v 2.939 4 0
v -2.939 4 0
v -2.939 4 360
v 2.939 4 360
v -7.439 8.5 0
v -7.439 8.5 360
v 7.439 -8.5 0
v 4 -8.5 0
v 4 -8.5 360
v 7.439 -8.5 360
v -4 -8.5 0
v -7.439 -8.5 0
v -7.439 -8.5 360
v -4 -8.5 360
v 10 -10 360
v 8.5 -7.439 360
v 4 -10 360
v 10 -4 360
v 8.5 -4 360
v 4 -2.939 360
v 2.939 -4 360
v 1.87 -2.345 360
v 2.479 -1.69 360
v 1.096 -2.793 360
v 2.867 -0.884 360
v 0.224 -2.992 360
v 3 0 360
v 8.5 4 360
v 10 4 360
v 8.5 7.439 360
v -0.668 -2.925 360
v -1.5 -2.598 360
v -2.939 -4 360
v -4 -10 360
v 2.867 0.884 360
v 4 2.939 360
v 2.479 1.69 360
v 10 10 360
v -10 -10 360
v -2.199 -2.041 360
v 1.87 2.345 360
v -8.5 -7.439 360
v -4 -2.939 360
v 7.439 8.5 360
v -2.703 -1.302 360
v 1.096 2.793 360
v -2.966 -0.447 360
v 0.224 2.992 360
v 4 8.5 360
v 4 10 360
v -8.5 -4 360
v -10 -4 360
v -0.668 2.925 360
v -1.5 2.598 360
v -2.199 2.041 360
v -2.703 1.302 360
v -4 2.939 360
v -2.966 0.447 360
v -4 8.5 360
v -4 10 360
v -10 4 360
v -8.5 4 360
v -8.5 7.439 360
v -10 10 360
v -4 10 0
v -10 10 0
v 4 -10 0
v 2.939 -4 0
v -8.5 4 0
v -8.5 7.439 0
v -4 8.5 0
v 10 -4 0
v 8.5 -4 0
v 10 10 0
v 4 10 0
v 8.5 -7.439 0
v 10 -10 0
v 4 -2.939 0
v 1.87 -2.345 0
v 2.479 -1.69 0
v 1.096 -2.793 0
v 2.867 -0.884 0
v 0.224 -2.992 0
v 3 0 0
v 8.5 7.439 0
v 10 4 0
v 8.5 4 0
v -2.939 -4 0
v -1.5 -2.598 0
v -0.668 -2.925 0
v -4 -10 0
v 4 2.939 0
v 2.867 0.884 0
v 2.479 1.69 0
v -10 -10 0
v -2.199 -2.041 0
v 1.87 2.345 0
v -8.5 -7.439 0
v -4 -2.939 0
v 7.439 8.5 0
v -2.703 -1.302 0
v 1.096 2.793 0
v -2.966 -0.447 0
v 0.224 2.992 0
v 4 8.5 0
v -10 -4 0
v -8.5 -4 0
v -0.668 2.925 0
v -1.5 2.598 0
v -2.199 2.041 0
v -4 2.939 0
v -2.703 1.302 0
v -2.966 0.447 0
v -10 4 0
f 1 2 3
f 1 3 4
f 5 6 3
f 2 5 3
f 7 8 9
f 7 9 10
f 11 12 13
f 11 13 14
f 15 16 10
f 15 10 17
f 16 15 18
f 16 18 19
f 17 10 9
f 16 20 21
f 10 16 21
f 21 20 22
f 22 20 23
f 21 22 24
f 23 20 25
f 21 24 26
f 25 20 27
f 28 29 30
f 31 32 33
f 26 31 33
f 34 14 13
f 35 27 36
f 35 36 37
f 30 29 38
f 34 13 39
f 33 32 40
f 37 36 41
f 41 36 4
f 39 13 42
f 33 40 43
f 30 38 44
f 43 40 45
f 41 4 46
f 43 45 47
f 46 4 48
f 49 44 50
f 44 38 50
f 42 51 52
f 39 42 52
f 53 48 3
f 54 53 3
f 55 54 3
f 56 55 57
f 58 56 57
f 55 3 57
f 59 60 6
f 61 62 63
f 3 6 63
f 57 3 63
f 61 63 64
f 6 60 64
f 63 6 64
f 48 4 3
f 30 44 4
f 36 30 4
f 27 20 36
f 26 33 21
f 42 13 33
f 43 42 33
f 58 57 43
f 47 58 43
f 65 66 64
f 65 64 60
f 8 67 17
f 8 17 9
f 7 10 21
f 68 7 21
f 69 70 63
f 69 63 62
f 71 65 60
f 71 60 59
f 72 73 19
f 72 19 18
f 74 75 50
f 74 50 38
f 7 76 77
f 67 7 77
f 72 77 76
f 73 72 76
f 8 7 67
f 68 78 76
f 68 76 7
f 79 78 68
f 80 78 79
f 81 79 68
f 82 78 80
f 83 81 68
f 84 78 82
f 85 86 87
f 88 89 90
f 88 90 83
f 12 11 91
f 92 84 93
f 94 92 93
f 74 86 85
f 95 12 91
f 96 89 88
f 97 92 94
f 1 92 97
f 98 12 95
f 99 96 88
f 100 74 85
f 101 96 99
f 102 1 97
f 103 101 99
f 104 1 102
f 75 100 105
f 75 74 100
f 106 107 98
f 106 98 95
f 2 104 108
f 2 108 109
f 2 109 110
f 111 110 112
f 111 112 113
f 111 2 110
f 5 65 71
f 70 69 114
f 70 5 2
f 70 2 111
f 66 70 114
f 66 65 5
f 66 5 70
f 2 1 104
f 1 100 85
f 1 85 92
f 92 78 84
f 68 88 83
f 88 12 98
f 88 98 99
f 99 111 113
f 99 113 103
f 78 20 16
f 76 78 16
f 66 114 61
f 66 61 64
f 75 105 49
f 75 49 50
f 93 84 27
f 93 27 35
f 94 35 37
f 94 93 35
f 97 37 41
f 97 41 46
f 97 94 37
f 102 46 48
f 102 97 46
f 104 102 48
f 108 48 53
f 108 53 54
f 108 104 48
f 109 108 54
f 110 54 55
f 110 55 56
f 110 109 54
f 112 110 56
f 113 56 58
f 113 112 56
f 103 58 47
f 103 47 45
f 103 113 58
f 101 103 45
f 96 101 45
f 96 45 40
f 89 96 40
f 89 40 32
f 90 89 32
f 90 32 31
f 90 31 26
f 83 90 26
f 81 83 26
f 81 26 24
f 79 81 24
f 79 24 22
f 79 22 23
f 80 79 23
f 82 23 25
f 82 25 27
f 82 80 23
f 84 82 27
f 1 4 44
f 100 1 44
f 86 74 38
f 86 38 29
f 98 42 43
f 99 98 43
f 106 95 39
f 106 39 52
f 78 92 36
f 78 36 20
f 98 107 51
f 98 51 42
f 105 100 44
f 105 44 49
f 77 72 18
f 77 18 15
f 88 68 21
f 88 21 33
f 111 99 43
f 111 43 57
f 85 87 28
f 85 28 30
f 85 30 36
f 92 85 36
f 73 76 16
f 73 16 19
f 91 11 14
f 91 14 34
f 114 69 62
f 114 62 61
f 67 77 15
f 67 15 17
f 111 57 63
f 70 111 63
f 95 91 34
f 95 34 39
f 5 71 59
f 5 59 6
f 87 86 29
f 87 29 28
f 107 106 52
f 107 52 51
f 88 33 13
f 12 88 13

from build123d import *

# Parameters (mm, degrees)
ESBO_O1_R                = 3
RESSALTO_EXTRUS_O1_DEPTH = 360


with BuildPart() as part:
    # Esboço1 → Ressalto-extrusão1 (new body)
    with BuildSketch(Plane.XY):
        Polygon((-2.939339828, 4), (2.939339828, 4), (7.439339828, 8.5), (4, 8.5), (4, 10), (10, 10), (10, 4), (8.5, 4), (8.5, 7.439339828), (4, 2.939339828), (4, -2.939339828), (8.5, -7.439339828), (8.5, -4), (10, -4), (10, -10), (4, -10), (4, -8.5), (7.439339828, -8.5), (2.939339828, -4), (-2.939339828, -4), (-7.439339828, -8.5), (-4, -8.5), (-4, -10), (-10, -10), (-10, -4), (-8.5, -4), (-8.5, -7.439339828), (-4, -2.939339828), (-4, 2.939339828), (-8.5, 7.439339828), (-8.5, 4), (-10, 4), (-10, 10), (-4, 10), (-4, 8.5), (-7.439339828, 8.5), align=None)
        Circle(ESBO_O1_R, mode=Mode.SUBTRACT)
    extrude(amount=RESSALTO_EXTRUS_O1_DEPTH)


solid = part.part
